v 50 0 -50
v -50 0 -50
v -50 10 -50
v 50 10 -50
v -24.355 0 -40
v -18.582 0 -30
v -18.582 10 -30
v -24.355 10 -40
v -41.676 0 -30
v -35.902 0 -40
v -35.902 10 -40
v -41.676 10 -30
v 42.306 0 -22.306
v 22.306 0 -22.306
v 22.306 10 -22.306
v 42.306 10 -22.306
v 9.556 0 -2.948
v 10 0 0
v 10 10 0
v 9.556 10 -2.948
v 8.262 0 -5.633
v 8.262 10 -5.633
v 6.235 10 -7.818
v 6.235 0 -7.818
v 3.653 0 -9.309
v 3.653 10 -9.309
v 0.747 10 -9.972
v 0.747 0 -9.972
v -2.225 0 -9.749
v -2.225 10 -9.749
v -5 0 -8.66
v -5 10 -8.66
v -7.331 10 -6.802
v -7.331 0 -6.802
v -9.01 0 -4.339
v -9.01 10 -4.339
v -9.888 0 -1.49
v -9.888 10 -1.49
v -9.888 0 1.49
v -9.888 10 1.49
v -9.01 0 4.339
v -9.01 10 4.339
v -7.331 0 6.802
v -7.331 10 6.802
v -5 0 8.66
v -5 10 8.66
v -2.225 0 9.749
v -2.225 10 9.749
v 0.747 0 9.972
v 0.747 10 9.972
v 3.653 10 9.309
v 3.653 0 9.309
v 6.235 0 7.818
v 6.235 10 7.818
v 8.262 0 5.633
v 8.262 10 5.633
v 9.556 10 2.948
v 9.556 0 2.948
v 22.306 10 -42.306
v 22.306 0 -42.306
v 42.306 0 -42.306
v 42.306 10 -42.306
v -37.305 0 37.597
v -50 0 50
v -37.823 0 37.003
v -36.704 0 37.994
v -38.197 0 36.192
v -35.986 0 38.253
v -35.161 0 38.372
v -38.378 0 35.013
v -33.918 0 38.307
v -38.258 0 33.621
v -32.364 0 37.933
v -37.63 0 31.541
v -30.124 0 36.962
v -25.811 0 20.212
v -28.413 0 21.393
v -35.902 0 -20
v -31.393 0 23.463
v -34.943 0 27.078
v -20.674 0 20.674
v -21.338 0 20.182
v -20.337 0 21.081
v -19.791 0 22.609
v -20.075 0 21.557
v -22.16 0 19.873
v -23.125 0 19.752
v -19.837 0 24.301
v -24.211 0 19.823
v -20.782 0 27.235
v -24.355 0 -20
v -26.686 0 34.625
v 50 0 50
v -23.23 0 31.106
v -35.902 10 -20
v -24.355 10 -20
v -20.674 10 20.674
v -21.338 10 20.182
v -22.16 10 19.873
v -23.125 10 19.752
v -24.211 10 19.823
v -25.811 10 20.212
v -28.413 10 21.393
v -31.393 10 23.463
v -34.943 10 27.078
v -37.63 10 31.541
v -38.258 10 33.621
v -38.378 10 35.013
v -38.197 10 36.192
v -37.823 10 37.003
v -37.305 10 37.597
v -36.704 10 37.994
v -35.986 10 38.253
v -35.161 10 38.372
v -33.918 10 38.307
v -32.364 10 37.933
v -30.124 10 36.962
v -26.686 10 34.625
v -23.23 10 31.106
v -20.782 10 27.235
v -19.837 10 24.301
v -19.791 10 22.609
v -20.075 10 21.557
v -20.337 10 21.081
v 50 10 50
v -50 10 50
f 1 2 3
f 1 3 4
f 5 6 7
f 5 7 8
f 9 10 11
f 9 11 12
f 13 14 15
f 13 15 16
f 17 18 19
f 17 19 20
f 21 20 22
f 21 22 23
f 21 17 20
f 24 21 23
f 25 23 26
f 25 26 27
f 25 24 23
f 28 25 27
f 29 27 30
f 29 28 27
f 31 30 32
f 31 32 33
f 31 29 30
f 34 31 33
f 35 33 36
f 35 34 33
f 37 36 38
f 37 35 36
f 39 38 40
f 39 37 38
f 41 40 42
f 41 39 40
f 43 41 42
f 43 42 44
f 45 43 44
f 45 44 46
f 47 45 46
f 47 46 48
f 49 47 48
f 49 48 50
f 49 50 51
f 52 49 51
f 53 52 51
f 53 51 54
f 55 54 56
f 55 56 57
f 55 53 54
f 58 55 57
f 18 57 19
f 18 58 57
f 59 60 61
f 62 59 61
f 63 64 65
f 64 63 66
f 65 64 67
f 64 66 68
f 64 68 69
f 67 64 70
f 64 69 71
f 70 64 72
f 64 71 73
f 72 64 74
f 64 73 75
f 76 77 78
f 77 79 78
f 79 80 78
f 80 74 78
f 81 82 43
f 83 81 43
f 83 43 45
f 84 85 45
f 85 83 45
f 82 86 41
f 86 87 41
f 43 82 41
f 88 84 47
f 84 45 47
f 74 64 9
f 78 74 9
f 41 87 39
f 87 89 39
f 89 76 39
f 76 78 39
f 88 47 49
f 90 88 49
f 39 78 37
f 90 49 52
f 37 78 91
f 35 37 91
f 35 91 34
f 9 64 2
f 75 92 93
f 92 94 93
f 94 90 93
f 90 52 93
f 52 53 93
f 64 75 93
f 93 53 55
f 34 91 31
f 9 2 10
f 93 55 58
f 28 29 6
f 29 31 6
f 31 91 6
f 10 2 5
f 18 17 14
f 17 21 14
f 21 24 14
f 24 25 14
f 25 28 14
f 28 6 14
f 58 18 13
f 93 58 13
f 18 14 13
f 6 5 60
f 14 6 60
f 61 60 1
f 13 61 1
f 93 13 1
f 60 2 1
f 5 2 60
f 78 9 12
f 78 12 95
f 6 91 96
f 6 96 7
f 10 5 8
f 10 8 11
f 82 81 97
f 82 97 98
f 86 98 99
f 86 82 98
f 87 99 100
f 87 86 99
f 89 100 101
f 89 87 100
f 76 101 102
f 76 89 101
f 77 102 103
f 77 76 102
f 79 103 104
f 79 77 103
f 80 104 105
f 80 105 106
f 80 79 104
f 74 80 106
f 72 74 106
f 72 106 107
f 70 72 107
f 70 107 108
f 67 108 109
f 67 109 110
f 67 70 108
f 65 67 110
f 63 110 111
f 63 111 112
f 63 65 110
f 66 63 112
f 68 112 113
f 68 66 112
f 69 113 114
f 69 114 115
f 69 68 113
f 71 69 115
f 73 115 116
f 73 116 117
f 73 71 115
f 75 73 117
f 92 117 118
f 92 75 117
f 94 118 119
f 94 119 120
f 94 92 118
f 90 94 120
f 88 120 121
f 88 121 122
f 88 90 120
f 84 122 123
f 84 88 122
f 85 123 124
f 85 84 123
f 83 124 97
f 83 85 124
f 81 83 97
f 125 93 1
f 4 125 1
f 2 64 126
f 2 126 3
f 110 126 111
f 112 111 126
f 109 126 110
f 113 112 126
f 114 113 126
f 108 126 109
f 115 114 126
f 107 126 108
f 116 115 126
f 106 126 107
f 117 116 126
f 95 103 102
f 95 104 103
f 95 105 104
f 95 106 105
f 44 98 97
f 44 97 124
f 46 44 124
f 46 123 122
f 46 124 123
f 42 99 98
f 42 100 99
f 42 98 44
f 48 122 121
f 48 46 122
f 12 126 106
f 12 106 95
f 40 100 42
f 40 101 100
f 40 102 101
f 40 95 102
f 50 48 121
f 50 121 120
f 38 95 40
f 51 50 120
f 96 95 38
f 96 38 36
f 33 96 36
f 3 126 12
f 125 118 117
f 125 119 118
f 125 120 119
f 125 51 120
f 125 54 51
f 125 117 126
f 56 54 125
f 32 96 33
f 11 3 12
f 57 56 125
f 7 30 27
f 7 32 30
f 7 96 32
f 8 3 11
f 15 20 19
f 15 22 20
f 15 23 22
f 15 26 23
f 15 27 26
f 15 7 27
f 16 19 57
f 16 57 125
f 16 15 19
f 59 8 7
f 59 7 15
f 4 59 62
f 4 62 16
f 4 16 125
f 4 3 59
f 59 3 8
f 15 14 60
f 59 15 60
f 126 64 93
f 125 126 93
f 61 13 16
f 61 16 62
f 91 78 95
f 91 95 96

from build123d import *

# Parameters (mm, degrees)
SKETCH1_W           = 100
SKETCH1_H           = 100
SKETCH1_R           = 10
SKETCH1_RX          = 11.867112324
SKETCH1_RY          = 5.7171528
SKETCH1_W_2         = 20
SKETCH1_H_2         = 20
BOSS_EXTRUDE1_DEPTH = 10


with BuildPart() as part:
    # Sketch1 → Boss-Extrude1 (new body)
    with BuildSketch(Plane(origin=(0, 0, 0), x_dir=(1, 0, 0), z_dir=(0, 1, 0))):
        Rectangle(SKETCH1_W, SKETCH1_H)
        Circle(SKETCH1_R, mode=Mode.SUBTRACT)
        with Locations(Location((-29.06507818, -29.06507818), (0, 0, 45))):
            Ellipse(SKETCH1_RX, SKETCH1_RY, mode=Mode.SUBTRACT)
        Polygon((-18.581564885, 30), (-24.355067577, 40), (-35.902072961, 40), (-41.675575653, 30), (-35.902072961, 20), (-24.355067577, 20), align=None, mode=Mode.SUBTRACT)
        with Locations((32.305830442, 32.305830442)):
            Rectangle(SKETCH1_W_2, SKETCH1_H_2, mode=Mode.SUBTRACT)
    extrude(amount=BOSS_EXTRUDE1_DEPTH)


solid = part.part
